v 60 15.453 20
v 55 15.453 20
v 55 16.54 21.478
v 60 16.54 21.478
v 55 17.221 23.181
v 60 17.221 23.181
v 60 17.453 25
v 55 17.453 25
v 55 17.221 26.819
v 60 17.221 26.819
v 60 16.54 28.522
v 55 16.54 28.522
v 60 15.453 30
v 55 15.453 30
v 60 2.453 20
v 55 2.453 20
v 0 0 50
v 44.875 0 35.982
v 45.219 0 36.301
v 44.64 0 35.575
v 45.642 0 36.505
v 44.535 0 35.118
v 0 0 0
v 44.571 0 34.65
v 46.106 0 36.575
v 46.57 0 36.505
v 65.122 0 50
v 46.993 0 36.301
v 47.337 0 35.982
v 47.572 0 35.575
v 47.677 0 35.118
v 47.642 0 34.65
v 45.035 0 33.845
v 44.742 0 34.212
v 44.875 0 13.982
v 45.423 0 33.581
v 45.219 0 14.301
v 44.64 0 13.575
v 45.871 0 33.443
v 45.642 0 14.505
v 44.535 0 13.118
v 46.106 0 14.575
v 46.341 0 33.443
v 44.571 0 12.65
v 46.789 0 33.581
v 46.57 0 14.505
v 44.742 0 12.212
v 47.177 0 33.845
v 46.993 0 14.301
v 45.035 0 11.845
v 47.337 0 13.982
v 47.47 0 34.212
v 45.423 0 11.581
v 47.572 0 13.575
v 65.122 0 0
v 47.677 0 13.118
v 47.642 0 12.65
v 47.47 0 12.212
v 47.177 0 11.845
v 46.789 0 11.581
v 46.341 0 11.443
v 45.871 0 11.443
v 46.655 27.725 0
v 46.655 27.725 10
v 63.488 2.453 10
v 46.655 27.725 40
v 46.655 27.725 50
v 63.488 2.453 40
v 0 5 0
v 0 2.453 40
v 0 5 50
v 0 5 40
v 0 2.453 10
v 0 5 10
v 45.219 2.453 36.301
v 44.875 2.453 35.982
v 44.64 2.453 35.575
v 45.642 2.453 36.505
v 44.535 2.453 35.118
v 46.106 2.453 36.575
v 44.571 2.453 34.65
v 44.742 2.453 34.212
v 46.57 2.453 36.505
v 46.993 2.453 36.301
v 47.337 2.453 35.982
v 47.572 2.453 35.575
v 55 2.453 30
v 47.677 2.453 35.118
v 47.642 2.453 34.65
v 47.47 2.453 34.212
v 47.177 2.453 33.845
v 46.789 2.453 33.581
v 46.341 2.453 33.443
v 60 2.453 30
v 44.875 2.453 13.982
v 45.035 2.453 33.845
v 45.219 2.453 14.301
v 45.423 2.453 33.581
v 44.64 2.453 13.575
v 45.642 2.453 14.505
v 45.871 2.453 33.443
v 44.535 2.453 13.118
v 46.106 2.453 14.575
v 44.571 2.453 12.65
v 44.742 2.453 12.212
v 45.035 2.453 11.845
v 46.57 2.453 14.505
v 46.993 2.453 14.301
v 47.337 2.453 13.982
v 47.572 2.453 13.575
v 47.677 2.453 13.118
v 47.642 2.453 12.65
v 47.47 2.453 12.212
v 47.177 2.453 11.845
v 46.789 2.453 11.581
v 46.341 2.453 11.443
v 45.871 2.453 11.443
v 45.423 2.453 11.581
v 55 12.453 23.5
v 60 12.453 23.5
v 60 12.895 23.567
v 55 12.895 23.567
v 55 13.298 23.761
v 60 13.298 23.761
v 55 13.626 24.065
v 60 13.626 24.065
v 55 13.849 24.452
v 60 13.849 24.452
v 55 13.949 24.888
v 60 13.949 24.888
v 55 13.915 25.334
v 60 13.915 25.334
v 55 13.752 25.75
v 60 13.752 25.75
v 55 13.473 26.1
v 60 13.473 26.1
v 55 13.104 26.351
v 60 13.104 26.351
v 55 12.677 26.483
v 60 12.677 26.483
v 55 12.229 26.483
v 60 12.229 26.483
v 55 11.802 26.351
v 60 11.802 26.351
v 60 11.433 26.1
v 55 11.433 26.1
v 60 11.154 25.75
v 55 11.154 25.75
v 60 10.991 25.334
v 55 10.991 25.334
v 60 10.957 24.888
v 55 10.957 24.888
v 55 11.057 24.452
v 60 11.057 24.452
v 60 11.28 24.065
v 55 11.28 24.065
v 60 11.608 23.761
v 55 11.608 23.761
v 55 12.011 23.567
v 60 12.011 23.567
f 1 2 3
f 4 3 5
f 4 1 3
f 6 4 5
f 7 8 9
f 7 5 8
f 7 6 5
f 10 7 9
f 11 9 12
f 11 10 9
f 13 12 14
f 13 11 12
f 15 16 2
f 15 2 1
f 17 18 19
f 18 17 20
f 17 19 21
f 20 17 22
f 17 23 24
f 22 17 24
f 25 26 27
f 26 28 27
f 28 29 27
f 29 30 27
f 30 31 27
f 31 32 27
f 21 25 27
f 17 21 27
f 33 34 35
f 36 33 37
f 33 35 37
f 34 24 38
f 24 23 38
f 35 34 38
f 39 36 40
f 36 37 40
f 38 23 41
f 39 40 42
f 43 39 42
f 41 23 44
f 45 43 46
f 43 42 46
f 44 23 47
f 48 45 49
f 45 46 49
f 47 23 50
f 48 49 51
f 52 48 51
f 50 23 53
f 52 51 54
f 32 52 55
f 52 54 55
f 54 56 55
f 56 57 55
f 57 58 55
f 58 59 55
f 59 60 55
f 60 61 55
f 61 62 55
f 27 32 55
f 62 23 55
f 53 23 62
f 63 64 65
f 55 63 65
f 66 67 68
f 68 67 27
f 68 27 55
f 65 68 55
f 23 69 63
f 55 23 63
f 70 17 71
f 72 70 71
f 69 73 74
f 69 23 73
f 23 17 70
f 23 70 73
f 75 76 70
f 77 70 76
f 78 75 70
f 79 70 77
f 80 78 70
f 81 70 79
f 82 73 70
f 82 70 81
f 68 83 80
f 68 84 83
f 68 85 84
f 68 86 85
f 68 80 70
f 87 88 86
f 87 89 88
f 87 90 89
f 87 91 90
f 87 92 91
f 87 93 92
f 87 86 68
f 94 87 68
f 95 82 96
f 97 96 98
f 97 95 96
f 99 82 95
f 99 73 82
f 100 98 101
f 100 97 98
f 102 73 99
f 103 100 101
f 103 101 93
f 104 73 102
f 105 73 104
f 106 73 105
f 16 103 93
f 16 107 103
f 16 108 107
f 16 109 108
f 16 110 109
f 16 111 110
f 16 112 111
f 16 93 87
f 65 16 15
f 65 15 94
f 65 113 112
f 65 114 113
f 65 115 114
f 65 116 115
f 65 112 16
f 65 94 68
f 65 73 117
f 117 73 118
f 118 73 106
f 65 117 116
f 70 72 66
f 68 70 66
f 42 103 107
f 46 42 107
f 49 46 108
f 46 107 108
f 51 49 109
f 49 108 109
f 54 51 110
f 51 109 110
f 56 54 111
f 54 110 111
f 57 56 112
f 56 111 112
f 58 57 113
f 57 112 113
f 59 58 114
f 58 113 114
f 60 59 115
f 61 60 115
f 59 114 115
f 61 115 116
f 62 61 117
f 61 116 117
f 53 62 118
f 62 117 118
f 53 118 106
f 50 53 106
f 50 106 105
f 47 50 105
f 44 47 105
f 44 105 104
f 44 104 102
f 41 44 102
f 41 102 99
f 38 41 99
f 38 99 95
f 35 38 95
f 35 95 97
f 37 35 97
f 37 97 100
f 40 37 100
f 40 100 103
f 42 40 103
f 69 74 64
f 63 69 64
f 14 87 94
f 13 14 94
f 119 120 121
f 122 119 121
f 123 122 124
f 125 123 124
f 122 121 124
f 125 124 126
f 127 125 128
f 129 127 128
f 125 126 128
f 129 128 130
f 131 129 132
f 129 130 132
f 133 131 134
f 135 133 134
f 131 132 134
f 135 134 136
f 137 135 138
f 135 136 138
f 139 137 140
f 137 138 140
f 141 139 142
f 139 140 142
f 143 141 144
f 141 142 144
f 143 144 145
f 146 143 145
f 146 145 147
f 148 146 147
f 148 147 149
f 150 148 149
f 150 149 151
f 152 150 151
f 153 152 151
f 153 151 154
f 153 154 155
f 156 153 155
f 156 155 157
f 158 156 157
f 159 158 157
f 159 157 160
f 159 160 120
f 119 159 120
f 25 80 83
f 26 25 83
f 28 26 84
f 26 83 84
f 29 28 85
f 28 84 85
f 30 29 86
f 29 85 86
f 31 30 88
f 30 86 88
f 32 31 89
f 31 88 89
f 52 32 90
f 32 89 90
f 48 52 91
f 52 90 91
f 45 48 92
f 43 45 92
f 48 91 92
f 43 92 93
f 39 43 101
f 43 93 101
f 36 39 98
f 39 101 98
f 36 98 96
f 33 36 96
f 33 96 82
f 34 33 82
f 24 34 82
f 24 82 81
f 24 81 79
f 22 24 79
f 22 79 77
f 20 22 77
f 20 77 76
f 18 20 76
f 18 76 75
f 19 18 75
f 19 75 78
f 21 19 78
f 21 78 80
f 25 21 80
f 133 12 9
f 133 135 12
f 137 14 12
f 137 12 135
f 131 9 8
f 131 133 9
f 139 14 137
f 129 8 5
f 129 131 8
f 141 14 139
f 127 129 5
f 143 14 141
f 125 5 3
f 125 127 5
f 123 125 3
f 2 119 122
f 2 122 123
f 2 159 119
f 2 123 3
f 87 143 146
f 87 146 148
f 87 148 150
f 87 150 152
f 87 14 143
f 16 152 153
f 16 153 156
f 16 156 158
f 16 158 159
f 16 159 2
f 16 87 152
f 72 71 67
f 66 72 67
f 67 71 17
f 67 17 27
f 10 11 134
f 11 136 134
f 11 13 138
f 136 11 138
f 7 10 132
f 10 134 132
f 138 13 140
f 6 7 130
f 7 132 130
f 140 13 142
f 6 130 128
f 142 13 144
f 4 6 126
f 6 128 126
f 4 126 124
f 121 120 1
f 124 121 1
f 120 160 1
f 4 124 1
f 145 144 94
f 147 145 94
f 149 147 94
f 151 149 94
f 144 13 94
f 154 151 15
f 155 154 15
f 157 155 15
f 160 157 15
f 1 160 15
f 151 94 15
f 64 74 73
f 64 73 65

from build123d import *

# Parameters (mm, degrees)
SKETCH1_W           = 65.122
SKETCH1_H           = 27.725
BOSS_EXTRUDE1_DEPTH = 50
SKETCH3_W           = 65.122
SKETCH3_H           = 30
CUT_EXTRUDE1_DEPTH  = 25.272
CUT_EXTRUDE2_DEPTH  = 87.657662725
CUT_EXTRUDE3_DEPTH  = 87.657662725
SKETCH6_W           = 5
SKETCH6_H           = 10
BOSS_EXTRUDE2_DEPTH = 15
CUT_EXTRUDE5_DEPTH  = 15
SKETCH9_R           = 1.5
CUT_EXTRUDE6_DEPTH  = 83.877473568
SKETCH10_R          = 1.575
CUT_EXTRUDE7_DEPTH  = 86.904300637


with BuildPart() as part:
    # Sketch1 → Boss-Extrude1 (new body)
    with BuildSketch(Plane.XY):
        with Locations((32.561, 13.8625)):
            Rectangle(SKETCH1_W, SKETCH1_H)
    extrude(amount=BOSS_EXTRUDE1_DEPTH)

    # Sketch3 → Cut-Extrude1 (cut)
    with BuildSketch(Plane(origin=(0, 27.725, 0), x_dir=(1, 0, 0), z_dir=(0, 1, 0))):
        with Locations((32.561, -25)):
            Rectangle(SKETCH3_W, SKETCH3_H)
    extrude(amount=-CUT_EXTRUDE1_DEPTH, mode=Mode.SUBTRACT)

    # Sketch4 → Cut-Extrude2 (cut, through all)
    with BuildSketch(Plane.XY.offset(50)):
        Polygon((0, 27.725), (0, 5), (46.655, 27.725), align=None)
    extrude(amount=-CUT_EXTRUDE2_DEPTH, mode=Mode.SUBTRACT)

    # Sketch5 → Cut-Extrude3 (cut, through all)
    with BuildSketch(Plane.XY.offset(50)):
        Polygon((46.655, 27.725), (65.122, 0), (65.122, 27.725), align=None)
    extrude(amount=-CUT_EXTRUDE3_DEPTH, mode=Mode.SUBTRACT)

    # Sketch6 → Boss-Extrude2 (add)
    with BuildSketch(Plane(origin=(0, 2.453, 0), x_dir=(1, 0, 0), z_dir=(0, 1, 0))):
        with Locations((57.5, -25)):
            Rectangle(SKETCH6_W, SKETCH6_H)
    extrude(amount=BOSS_EXTRUDE2_DEPTH)

    # Sketch7 → Cut-Extrude5 (cut)
    with BuildSketch(Plane(origin=(60, 0, 0), x_dir=(0, 0, -1), z_dir=(1, 0, 0))):
        with BuildLine():
            Line((-30, 15.453), (-30, 17.453))
            Line((-30, 17.453), (-24.889040711, 17.831001858))
            Line((-24.889040711, 17.831001858), (-20, 17.453))
            Line((-20, 17.453), (-20, 15.453))
            ThreePointArc((-20, 15.453), (-25, 17.453), (-30, 15.453))
        make_face()
    extrude(amount=-CUT_EXTRUDE5_DEPTH, mode=Mode.SUBTRACT)

    # Sketch9 → Cut-Extrude6 (cut, through all)
    with BuildSketch(Plane(origin=(60, 0, 0), x_dir=(0, 0, -1), z_dir=(1, 0, 0))):
        with Locations((-25, 12.453)):
            Circle(SKETCH9_R)
    extrude(amount=-CUT_EXTRUDE6_DEPTH, mode=Mode.SUBTRACT)

    # Sketch10 → Cut-Extrude7 (cut, through all)
    with BuildSketch(Plane(origin=(0, 2.453, 0), x_dir=(1, 0, 0), z_dir=(0, 1, 0))):
        with Locations(Location((46.10608811, -35, 0), (0, 0, 270))):
            Circle(SKETCH10_R)
        with Locations(Location((46.10608811, -13, 0), (0, 0, 270))):
            Circle(SKETCH10_R)
    extrude(amount=-CUT_EXTRUDE7_DEPTH, mode=Mode.SUBTRACT)


solid = part.part
